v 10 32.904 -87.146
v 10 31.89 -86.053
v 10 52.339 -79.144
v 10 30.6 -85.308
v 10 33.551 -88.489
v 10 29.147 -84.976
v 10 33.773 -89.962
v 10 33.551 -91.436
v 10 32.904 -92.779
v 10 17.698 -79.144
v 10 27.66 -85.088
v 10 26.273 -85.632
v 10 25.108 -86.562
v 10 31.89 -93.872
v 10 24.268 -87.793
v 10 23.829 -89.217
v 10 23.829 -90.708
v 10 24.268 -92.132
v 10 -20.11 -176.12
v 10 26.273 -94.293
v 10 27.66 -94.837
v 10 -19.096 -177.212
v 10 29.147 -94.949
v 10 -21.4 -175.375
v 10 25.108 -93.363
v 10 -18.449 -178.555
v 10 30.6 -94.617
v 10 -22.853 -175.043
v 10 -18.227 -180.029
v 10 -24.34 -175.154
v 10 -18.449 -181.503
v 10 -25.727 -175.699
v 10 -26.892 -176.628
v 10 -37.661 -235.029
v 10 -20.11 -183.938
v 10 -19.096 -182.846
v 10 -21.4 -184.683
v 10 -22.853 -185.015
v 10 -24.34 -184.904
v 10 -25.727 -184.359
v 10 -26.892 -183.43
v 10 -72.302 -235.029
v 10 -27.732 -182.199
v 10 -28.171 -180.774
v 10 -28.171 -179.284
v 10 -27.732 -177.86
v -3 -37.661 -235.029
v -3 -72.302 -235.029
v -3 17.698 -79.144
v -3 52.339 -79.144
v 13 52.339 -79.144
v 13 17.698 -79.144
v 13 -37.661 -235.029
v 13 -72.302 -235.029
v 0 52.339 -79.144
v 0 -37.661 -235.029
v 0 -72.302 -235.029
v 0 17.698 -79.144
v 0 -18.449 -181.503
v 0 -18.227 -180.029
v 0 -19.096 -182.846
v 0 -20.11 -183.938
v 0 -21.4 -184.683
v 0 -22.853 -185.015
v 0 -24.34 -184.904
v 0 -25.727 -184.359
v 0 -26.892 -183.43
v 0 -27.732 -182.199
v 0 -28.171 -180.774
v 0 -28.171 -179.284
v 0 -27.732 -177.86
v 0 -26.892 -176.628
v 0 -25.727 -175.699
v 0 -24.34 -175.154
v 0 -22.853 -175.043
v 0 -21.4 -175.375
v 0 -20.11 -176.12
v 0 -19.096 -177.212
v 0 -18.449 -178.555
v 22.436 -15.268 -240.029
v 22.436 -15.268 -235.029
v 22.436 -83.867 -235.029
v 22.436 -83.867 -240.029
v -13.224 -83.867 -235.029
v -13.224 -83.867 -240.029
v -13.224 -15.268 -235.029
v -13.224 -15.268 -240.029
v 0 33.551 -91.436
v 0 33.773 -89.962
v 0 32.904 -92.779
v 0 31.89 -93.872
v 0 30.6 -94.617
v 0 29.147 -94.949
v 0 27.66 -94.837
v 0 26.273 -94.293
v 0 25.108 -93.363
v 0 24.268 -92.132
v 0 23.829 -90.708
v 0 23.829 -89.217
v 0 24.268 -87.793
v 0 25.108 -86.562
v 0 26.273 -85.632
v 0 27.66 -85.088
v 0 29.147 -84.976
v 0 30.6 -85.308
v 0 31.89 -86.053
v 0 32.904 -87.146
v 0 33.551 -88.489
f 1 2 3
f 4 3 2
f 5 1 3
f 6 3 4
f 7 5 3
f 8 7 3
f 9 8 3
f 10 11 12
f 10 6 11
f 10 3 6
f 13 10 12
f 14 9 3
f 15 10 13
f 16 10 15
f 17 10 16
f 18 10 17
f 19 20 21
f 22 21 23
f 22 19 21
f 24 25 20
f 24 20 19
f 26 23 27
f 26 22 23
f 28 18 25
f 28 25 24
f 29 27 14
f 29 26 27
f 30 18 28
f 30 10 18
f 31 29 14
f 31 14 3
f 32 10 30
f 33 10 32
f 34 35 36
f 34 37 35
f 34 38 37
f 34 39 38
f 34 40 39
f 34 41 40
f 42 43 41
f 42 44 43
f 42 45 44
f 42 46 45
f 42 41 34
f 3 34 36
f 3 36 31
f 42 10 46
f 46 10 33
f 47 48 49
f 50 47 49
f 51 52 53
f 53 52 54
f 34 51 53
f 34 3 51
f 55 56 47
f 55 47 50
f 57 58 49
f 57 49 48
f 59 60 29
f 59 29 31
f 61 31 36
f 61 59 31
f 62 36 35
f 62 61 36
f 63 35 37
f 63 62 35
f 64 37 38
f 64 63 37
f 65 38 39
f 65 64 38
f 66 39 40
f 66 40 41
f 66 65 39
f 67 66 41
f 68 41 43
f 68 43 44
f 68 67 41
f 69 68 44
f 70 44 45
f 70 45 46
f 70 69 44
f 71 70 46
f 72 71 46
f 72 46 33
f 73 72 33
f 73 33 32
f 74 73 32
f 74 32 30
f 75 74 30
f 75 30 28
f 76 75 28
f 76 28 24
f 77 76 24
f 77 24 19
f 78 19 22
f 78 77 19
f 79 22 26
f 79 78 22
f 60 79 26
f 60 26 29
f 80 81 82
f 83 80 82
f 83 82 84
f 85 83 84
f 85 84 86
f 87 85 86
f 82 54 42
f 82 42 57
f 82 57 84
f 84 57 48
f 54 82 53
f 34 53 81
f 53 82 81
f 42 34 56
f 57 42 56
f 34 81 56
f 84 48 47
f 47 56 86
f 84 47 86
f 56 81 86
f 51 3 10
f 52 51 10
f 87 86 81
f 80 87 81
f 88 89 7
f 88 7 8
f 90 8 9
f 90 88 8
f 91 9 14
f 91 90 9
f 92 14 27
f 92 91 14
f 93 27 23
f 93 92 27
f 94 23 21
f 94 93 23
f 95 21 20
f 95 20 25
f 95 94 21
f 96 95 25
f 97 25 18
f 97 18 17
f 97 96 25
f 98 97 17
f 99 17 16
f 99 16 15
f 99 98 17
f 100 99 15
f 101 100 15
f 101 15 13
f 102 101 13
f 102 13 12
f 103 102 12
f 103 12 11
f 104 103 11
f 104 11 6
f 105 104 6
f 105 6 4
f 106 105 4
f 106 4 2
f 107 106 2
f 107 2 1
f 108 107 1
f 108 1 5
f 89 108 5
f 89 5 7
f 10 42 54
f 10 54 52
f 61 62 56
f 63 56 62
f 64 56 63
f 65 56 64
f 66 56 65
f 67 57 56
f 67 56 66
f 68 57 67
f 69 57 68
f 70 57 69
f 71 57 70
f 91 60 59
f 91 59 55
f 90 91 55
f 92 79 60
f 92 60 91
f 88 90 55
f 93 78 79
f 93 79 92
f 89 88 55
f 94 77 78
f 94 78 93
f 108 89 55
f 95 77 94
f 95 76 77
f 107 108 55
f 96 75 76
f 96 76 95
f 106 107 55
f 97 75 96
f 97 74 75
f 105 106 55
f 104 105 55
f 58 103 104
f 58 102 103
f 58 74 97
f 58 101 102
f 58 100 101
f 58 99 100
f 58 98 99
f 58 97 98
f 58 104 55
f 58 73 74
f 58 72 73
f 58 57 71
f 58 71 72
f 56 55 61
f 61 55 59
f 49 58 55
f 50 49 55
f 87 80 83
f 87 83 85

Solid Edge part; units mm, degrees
sketch "Sketch1" plane through (0, 0, 0) normal (1, 0, 0) x (0, 1, 0)
  line L0 (-37.6609, -235.0291) -> (52.3391, -79.1445)
  line L1 (17.698, -79.1445) -> (52.3391, -79.1445)
  line L2 (17.698, -79.1445) -> (-72.302, -235.0291)
  line L3 (-72.302, -235.0291) -> (-37.6609, -235.0291)
  dimension "D1" = 180
extrude "Protrusion1" add sketch "Sketch1" against normal blind 3
sketch "Sketch2" plane through (0, -21.8205, 20.1807) normal (1, 0, 0) x (0, 1, 0)
  circle A0 centre (50.5934, -110.1432) radius 5
  circle A1 centre (-1.4066, -200.2098) radius 5
  dimension "D1" = 55
  dimension "D2" = 15
  dimension "D3" = 104
  dimension "D4" = 15
extrude "ExtrudedProtrusion_2" add sketch "Sketch2" along normal blind 11
mirror "Mirror1" about plane through (5, -21.8205, 20.1506) normal (1, 0, 0) of "Protrusion1"
sketch "Sketch3" plane through (11.5, -54.9814, -235.0291) normal (0, 0, -1) x (0, 1, 0)
  line L0 (-28.8857, -24.7239) -> (39.7131, -24.7239)
  line L1 (39.7131, -24.7239) -> (39.7131, 10.9355)
  line L2 (39.7131, 10.9355) -> (-28.8857, 10.9355)
  line L3 (-28.8857, 10.9355) -> (-28.8857, -24.7239)
extrude "ExtrudedProtrusion_13" add sketch "Sketch3" along normal blind 5
properties material "Aluminum, 6061-T6"
